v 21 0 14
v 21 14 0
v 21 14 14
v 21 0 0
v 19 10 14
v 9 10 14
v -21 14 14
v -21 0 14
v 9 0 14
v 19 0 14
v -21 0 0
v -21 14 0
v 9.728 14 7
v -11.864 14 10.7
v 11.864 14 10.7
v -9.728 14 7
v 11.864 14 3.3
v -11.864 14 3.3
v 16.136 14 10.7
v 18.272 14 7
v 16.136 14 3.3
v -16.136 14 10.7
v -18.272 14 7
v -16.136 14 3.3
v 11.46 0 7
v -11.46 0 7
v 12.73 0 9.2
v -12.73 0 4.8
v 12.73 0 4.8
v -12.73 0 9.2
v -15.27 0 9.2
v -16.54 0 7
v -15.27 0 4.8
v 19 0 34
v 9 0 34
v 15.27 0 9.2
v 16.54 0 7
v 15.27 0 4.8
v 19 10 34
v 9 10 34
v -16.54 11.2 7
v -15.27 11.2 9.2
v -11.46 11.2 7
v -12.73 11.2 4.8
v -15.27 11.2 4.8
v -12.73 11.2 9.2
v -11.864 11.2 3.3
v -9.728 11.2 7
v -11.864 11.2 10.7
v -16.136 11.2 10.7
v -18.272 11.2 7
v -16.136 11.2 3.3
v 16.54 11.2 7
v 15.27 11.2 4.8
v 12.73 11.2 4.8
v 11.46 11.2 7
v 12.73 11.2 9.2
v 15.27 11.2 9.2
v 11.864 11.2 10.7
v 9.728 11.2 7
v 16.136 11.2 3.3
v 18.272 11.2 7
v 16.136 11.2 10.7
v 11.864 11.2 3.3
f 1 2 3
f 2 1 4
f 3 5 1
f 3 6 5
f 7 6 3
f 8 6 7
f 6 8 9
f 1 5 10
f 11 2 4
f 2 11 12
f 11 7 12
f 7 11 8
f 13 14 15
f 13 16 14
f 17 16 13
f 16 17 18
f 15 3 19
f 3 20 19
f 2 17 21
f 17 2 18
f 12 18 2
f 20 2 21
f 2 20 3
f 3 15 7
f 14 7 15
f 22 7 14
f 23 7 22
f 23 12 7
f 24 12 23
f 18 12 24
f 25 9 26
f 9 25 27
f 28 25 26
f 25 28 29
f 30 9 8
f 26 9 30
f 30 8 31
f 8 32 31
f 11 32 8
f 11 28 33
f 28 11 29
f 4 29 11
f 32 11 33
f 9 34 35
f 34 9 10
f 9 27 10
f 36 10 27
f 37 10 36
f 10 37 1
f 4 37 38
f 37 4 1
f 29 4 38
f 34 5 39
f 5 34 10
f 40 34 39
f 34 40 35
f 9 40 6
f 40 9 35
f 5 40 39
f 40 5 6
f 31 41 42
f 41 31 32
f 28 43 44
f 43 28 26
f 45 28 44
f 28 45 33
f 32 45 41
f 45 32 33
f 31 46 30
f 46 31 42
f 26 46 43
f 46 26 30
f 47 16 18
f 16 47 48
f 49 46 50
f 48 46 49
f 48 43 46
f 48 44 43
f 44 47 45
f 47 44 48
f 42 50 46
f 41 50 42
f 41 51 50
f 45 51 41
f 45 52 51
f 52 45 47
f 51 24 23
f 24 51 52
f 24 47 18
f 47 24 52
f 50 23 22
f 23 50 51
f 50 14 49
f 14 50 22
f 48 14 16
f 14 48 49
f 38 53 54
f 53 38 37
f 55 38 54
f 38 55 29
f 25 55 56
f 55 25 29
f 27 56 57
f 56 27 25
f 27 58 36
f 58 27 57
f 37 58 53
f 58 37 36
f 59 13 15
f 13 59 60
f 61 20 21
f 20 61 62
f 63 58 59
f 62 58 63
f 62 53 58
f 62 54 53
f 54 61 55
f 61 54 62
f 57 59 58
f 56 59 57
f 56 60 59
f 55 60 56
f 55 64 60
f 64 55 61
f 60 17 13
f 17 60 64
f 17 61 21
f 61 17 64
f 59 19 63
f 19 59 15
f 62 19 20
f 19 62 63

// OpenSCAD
// file: ../../../modules/steel_rack.scad
use <bolts.scad>;

bolt_edge_offset = 15;
bolt_positions = [
  bolt_edge_offset,
  bolt_edge_offset + 98,
  bolt_edge_offset + 98 + 24,
];

module bolt_and_nut(y, h) {
  nut_thickness = 5;
  translate([0, y, h / 2])
    m6_bolt_hole(h + 1, center = true);
  translate([0, y, h - nut_thickness / 2])
    rotate([0, 0, 90])
    m6_nut_trap(nut_thickness, center = true);
}

module long_bar(w, y, h) {
  difference() {
    translate([w / 2, y / 2, h / 2])
      cube([w, y, h], center = true);

    for (x = bolt_positions) {
      translate([x, 0, 0])
        bolt_and_nut(y / 2, h);
    }
  }
}

module short_bar(w, y, h) {
  difference() {
    translate([w / 2, y / 2, h / 2])
      cube([w, y, h], center = true);

    translate([bolt_positions[0], 0, 0])
      bolt_and_nut(y / 2, h);
  }
}

module fillet_profile(r, h) {
  linear_extrude(height = h, center = true)
    difference() {
      square([r, r]);
      circle(r = r, $fn = 64);
    }
}
// file: ../../../modules/bolts.scad
module nut_trap(d, h, center = true) {
  linear_extrude(height = h, center = center)
  circle(d = d / cos(30), $fn = 6);
}

module bolt_hole(d, h, center = true) {
  linear_extrude(height = h, center = center)
  circle(d = d, $fn = 64);
}

// Hex holes for self-tapping (nominal - 0.2mm)
module hex_hole(flat_d, h) {
  linear_extrude(height = h, center = true)
  circle(d = flat_d / cos(30), $fn = 6);
}

module m3_bolt_hexhole(h) {
  rotate([0, 0, 90]) hex_hole(flat_d = 2.8, h = h);
}

module m4_bolt_hexhole(h) {
  rotate([0, 0, 90]) hex_hole(flat_d = 3.8, h = h);
}

module m6_bolt_hexhole(h) {
  rotate([0, 0, 90]) hex_hole(flat_d = 5.8, h = h);
}

module m8_bolt_hexhole(h) {
  rotate([0, 0, 90]) hex_hole(flat_d = 7.8, h = h);
}

// M3
module m3_bolt_hole(h, center = false) { bolt_hole(d = 3.4, h = h, center = center); }
module m3_nut_trap(h, center = false) { nut_trap(d = 5.7, h = h, center = center); }

// M4
module m4_bolt_hole(h, center = false) { bolt_hole(d = 4.4, h = h, center = center); }
module m4_nut_trap(h, center = false) { nut_trap(d = 7.5, h = h, center = center); }

// M6
module m6_bolt_hole(h, center = false) { bolt_hole(d = 6.2, h = h, center = center); }
module m6_nut_trap(h, center = false) { nut_trap(d = 10.2, h = h, center = center); }

// M8
module m8_bolt_hole(h, center = false) { bolt_hole(d = 8.4, h = h, center = center); }
module m8_nut_trap(h, center = false) { nut_trap(d = 13.3, h = h, center = center); }
// file: ../../../modules/slide_rail_outer_bracket.scad
use <bolts.scad>
use <steel_rack.scad>

// スライドレール外側とL字アングルを接合するL字ブラケット。
// 設計の経緯と確定値は ledger/designs/steel-rack-500x400.md が正本。
//
// 座標系 (部品自身の datum):
//   X = 0 がこの部品側のL字アングル外側面。部品はアングル板厚の内側から始まる
//   Y = 0 がスライドレール外側面。+Y がラック外側
//   Z = 0 が部品底面 (レール下端と一致)
// front は screw_x = [37, 101.5]、rear は [79.5, 176] を自分の datum
// から渡す。 M6 が高さ 22.5±12 の対称配置のため部品は Z 反転対称になり、
// 左右のレールにも上下反転するだけで同じ2部品を使い回せる。

bracket_height = 45;
flange_t = 10; // 短辺 (X方向厚) の厚さ
// 長辺 (Y方向厚) の厚さ。旧断面は flange_t=10 を共用していたが、レール面を
// rail_offset 分外へ出すと M6 ナット挿入口が長辺と重なるため 2mm 削った
// (10→8、user決定)。ナット六角の内縁 (y=8.000) と長辺外面がツライチになる
arm_t = 8;
// レール接触面のラック外側オフセット。組付け実測でレール間隔が 385mm しか
// なくケース 412mm が入らないため、(412 - 385) / 2 + 0.5 = 14mm ずつ
// 各レールを外側へ移す (user指示)。M6 実穴は既に開いており位置を変えられない
rail_offset = 14;
inner_r = 4;
m6_z = [ 10.5, 34.5 ];
// クリアランス基準: 呼び寸法 + 0.4mm (実プリントの嵌合結果から拡大)
m6_pass_flat = 6.4; // M6ボルト通し六角の二面幅 (手前5mm)
m6_nut_flat = 10.4; // M6ナット窪み六角の二面幅 (奥5mm、ナット実測9.8 + 実効0.6)
m6_stage_depth = 5;
screw_z = 22.5;
m4_pass_flat = 4.4; // M4小トラスネジ通し六角の二面幅
m4_nut_flat = 7.4; // M4ナット窪み六角の二面幅 (ナット実測6.8 + 実効0.6)
m4_nut_depth = 2.8; // M4ナット窪みの深さ (user指定)
edge_margin = 8; // 穴の外縁から部品端までの余白 (自由な辺のみ)
angle_t = 2.2; // L字アングルの板厚

// 六角プリズム: 軸X・上下の辺が水平 (flat-up)。
// 天井を短い水平ブリッジにして垂れの改善を狙う
// (point-up だと天井面が水平から30°になり垂れた — 嵌合試験で確認済み)
module
hex_x_flat_up(flat_d, l)
{
    rotate([ 0, 90, 0 ]) rotate([ 0, 0, 90 ]) hex_hole(flat_d = flat_d, h = l);
}

// 六角プリズム: 軸Y・上下の辺が水平 (flat-up)。M6と同じくブリッジ天井
module
hex_y_flat_up(flat_d, l)
{
    rotate([ 90, 0, 0 ]) hex_hole(flat_d = flat_d, h = l);
}

module
slide_rail_outer_bracket(screw_x, name = "bracket")
{
    // flat-up配置では水平方向の穴半径は対角/2 (= 二面幅/(2*cos30))。
    // 8mm余白の契約はこの実半径に対して守る
    m6_nut_diag = m6_nut_flat / cos(30);
    m4_nut_diag = m4_nut_flat / cos(30);
    // M6中心: 実物のアングルには旧断面 (長辺厚10) の導出値
    // (厚10 + 内側R + 余白 + M6六角対角/2 = 28.0044) で既に穴が開いている。
    // 旧導出式から rail_offset を引くことで M6 実穴と部品外端の絶対位置を
    // 保ったまま、レール接触面 (y=0) だけをラック外側へ 14mm 出す
    m6_y = flange_t + inner_r + edge_margin + m6_nut_diag / 2 - rail_offset;
    short_len = m6_y + m6_nut_diag / 2 + edge_margin;
    // 長辺のX終端: 最奥のM4穴の最大断面 (ナット窪みの対角の半分) + 余白
    arm_end = max(screw_x) + m4_nut_diag / 2 + edge_margin;

    echo(str("CONTRACT ", name, ": height = ", bracket_height));
    echo(str("CONTRACT ", name, ": flange_t = ", flange_t));
    echo(str("CONTRACT ", name, ": arm_t = ", arm_t));
    echo(str("CONTRACT ", name, ": rail_offset = ", rail_offset));
    echo(str("CONTRACT ", name, ": inner_r = ", inner_r));
    echo(str("CONTRACT ", name, ": m6_z = ", m6_z));
    echo(str("CONTRACT ", name, ": m6_pass_flat = ", m6_pass_flat));
    echo(str("CONTRACT ", name, ": m6_nut_flat = ", m6_nut_flat));
    echo(str("CONTRACT ", name, ": screw_z = ", screw_z));
    echo(str("CONTRACT ", name, ": m4_pass_flat = ", m4_pass_flat));
    echo(str("CONTRACT ", name, ": m4_nut_flat = ", m4_nut_flat));
    echo(str("CONTRACT ", name, ": m4_nut_depth = ", m4_nut_depth));
    echo(str("CONTRACT ", name, ": edge_margin = ", edge_margin));
    echo(str("CONTRACT ", name, ": angle_t = ", angle_t));
    echo(str("CONTRACT ", name, ": screw_x = ", screw_x));
    echo(str("CONTRACT ",
             name,
             ": m6_y = ",
             m6_y,
             ", short_len = ",
             short_len,
             ", arm_end = ",
             arm_end));

    // 余白の契約 (自由な辺のみ。高さ45とM6のZはuser固定値なので対象外)。
    // M6ナット六角の内縁 (m6_y - 対角/2 = 8.000) は長辺外面 (y = arm_t) と
    // ツライチで、ナット挿入口が長辺に塞がれない (1e-9 は浮動小数の丸め猶予)
    assert(m6_y - m6_nut_diag / 2 >= arm_t - 1e-9,
           "M6 nut slot is blocked by the arm");
    assert(short_len - (m6_y + m6_nut_diag / 2) >= edge_margin,
           "M6 hole too close to the short-flange edge");
    assert(arm_end - (max(screw_x) + m4_nut_diag / 2) >= edge_margin,
           "M4 hole too close to the arm end");
    assert(min(screw_x) - m4_nut_diag / 2 >= angle_t + flange_t,
           "M4 hole overlaps the short flange");

    difference()
    {
        union()
        {
            // 短辺: アングル内側に当たる縦板 (M6で締結)
            translate([ angle_t, 0, 0 ])
                cube([ flange_t, short_len, bracket_height ]);

            // 長辺: レール外側面に当たる横板 (M4小トラスネジ+ナットで締結)
            translate([ angle_t, 0, 0 ])
                cube([ arm_end - angle_t, arm_t, bracket_height ]);

            // 内側コーナーのR4フィレット (応力集中の回避)
            translate([
                angle_t + flange_t + inner_r,
                arm_t + inner_r,
                bracket_height / 2
            ]) rotate([ 0, 0, 180 ]) fillet_profile(inner_r, bracket_height);
        }

        // M6の2段六角穴 (軸X・flat-up): 手前5mmが通し、奥5mmがナット窪み。
        // ナット窪みは +X へ延長した挿入回廊 (x=7.2..17): 短辺の背面から
        // fillet の掛かる区間を局所カットし、fillet 外端 (x=16.2) を 0.8mm
        // 超えて開放することで M6 ナットを +X 側から真っ直ぐ挿入できる
        // (fillet と挿入経路の干渉分を削るのは user 許容)。
        // 六角の下頂点 (y=8.000) は長辺外面とツライチで、正確な接触は
        // 退化した稜 (非多様体STL) を作るため、hull で 0.2mm 下へ掃引して
        // 長辺外面に浅い逃げ溝を彫る (ナットの嵌合には影響しない)
        slot_start = angle_t + flange_t - m6_stage_depth;
        slot_end = angle_t + flange_t + inner_r + 0.8;
        slot_relief = 0.2;
        for (z = m6_z) {
            translate([ angle_t + m6_stage_depth / 2 - 0.05, m6_y, z ])
                hex_x_flat_up(m6_pass_flat, m6_stage_depth + 0.1);
            translate([ (slot_start + slot_end) / 2, m6_y, z ]) hull()
            {
                hex_x_flat_up(m6_nut_flat, slot_end - slot_start);
                translate([ 0, -slot_relief, 0 ])
                    hex_x_flat_up(m6_nut_flat, slot_end - slot_start);
            }
        }

        // M4小トラスネジの穴 (軸Y・flat-up):
        // 通しは全厚を貫通し、L字の内側面 (y=8) から深さ2.8mmのナット窪み。
        // ネジはレール内側から刺さり
        // (トラス頭はスライダーと干渉しない実測済み)、
        // ナットが窪みの底で受けてレール板とブラケットを共締めする
        for (x = screw_x) {
            translate([ x, arm_t / 2, screw_z ])
                hex_y_flat_up(m4_pass_flat, arm_t + 0.2);
            translate([ x, arm_t - m4_nut_depth / 2 + 0.05, screw_z ])
                hex_y_flat_up(m4_nut_flat, m4_nut_depth + 0.1);
        }
    }
}
// file: ../../../modules/slide_rail_inner_block.scad
use <slide_rail_outer_bracket.scad>

// スライドレール内側とオープンフレームケースを繋ぐ支持部品の共通形状。
// 設計の経緯と確定値は ledger/designs/steel-rack-500x400.md が正本。
//
// 座標系 (部品自身の datum):
//   X = レール方向。M4 2穴の中点 (ブロック中心) が 0
//   Y = 0 がスライドレール(内)の接触面。+Y がラック中央 (ケース) 向き
//   Z = 0 がブロック底面
// レール(内)は高さ24.4mmで、そのド真ん中 (12.2mm) に横穴が28mm間隔で並ぶ。
// ブロックは穴中心 (部品 z = 7) で取り付くため、下端はレール下端から
// 約5.2mm浮く。ブロックの上に立つ10×10の柱でケースを浮かせて受ける。
//
// 印刷向き: ブロックを底面 (z=0) でビルドプレートへ置く。M4軸は水平になり、
// 六角穴はすべて flat-up (天井が短い水平ブリッジ) で外側ブラケットと揃う。

block_len = 42;    // X: 穴間28 + 14
block_depth = 14;  // Y
block_height = 14; // Z
m4_dx = 14;        // ブロック中心から各M4穴まで (間隔28)
m4_z = 7; // ブロック中心の高さ。レール横穴の12.2mmに合わせて付く
// クリアランス基準は外側ブラケットの実績値をそのまま流用する
// (呼び寸法+0.4 / ナットは実測+実効0.6。2026-08-14のuser指示)
m4_pass_flat = 4.4; // M4小トラスネジ通し六角の二面幅
m4_nut_flat = 7.4; // M4ナット窪み六角の二面幅 (ナット実測6.8 + 実効0.6)
m4_nut_depth = 2.8;   // M4ナット窪みの深さ
standoff = 10;        // 柱の一辺 (10×10)
standoff_height = 34; // 柱の全高 = ブロック14 + 上へ20突出

// standoff_offset: 柱の中心をブロック中心からずらす量 (X)。
// 対称型は 0 で X 鏡像不変になり、奥用はケース端との2mm逃げから +14。
// 導出 (ケース端の datum を持つのは entry 側) は各 entry のコメントを参照
module
slide_rail_inner_block(standoff_offset = 0, name = "inner")
{
    // flat-up配置では水平方向の穴半径は対角/2 (= 二面幅/(2*cos30))
    m4_nut_diag = m4_nut_flat / cos(30);

    echo(str("CONTRACT ",
             name,
             ": block = ",
             [ block_len, block_depth, block_height ]));
    echo(str("CONTRACT ", name, ": m4_x = ", [ -m4_dx, m4_dx ]));
    echo(str("CONTRACT ", name, ": m4_z = ", m4_z));
    echo(str("CONTRACT ", name, ": m4_pass_flat = ", m4_pass_flat));
    echo(str("CONTRACT ", name, ": m4_nut_flat = ", m4_nut_flat));
    echo(str("CONTRACT ", name, ": m4_nut_depth = ", m4_nut_depth));
    echo(str("CONTRACT ", name, ": standoff_offset = ", standoff_offset));
    echo(str("CONTRACT ",
             name,
             ": standoff = ",
             [ standoff, standoff, standoff_height ]));

    // 穴と窪みがブロックに収まる契約 (1e-9 は浮動小数の丸め猶予)
    assert(m4_dx + m4_nut_diag / 2 <= block_len / 2 + 1e-9,
           "M4 nut pocket runs past the block end");
    assert(m4_z - m4_nut_flat / 2 >= -1e-9 &&
               m4_z + m4_nut_flat / 2 <= block_height + 1e-9,
           "M4 nut pocket runs past the block top/bottom");
    assert(m4_nut_depth < block_depth,
           "M4 nut pocket is deeper than the block");
    // 柱がブロックのX範囲に収まる契約 (奥用の偏心で端から出ない)
    assert(abs(standoff_offset) + standoff / 2 <= block_len / 2 + 1e-9,
           "standoff runs past the block end");
    assert(standoff <= block_depth, "standoff is deeper than the block");

    difference()
    {
        union()
        {
            // ネジ穴ブロック: レール(内)の側面へ当てて共締めする本体
            translate([ -block_len / 2, 0, 0 ])
                cube([ block_len, block_depth, block_height ]);

            // スタンドオフ: ケースを浮かせて受ける柱。レール接触面
            // (y=0) とツライチで、ブロックより20mm高い
            translate([ standoff_offset - standoff / 2, 0, 0 ])
                cube([ standoff, standoff, standoff_height ]);
        }

        // M4小トラスネジの穴 (軸Y・flat-up): 外側ブラケットと同じ向きで、
        // 通しはレール側 (y=0) から全厚を貫通し、終わり際 (y=14の面) に
        // 深さ2.8mmのナット窪み。ネジはレール内側から刺さり、ナットが
        // 窪みの底で受けてレール板とブロックを共締めする
        for (x = [ -m4_dx, m4_dx ]) {
            translate([ x, block_depth / 2, m4_z ])
                hex_y_flat_up(m4_pass_flat, block_depth + 0.2);
            translate([ x, block_depth - m4_nut_depth / 2 + 0.05, m4_z ])
                hex_y_flat_up(m4_nut_flat, m4_nut_depth + 0.1);
        }
    }
}
// main file
use <../../../modules/slide_rail_inner_block.scad>

// スライドレール内側のケース支持部品 (奥用・ラック手前から見て左)。
// datum: X=0 は奥ペア (レール奥端から18/46mm) の中点 = 奥端から32mm。
// 向きの規約: 部品ローカル +X = ラック手前方向 (奥端から遠ざかる向き)。
// Y=0 がレール(内)の接触面。印刷向きは対称型と同じ (ブロック底面を下)。
//
// 奥ペアはレール奥端に寄っているため、柱をブロック中心に置くとケースの
// 外へ出てしまう。柱だけをラック手前側へ寄せてケース下へ入れる:
//   ケース端39 + 逃げ2 + 柱の半分5 = 41+5 = 46mm (奥端基準)
//   偏心 = 46 - 32 = 14mm
// この偏心が X 対称性を破るので、奥用だけ左右が別設計になる
// (右は slide_rail_inner_rear_r.scad = この形状の mirror([1,0,0]))。

rail_end_to_case = 39; // レール端からケース端まで (前後の隙間・一旦39mm)
// ケース端から柱のケース側の面までの逃げ。現物合わせ予定で、
// 組んでみてスカスカ・ガタつくようなら詰める (user)
standoff_inset = 2;
standoff_half = 5; // 10×10 柱の半分
pair_center = 32;  // 奥ペア (奥端から18/46mm) の中点

standoff_offset =
    rail_end_to_case + standoff_inset + standoff_half - pair_center;

slide_rail_inner_block(standoff_offset = standoff_offset,
                       name = "inner_rear_l");
